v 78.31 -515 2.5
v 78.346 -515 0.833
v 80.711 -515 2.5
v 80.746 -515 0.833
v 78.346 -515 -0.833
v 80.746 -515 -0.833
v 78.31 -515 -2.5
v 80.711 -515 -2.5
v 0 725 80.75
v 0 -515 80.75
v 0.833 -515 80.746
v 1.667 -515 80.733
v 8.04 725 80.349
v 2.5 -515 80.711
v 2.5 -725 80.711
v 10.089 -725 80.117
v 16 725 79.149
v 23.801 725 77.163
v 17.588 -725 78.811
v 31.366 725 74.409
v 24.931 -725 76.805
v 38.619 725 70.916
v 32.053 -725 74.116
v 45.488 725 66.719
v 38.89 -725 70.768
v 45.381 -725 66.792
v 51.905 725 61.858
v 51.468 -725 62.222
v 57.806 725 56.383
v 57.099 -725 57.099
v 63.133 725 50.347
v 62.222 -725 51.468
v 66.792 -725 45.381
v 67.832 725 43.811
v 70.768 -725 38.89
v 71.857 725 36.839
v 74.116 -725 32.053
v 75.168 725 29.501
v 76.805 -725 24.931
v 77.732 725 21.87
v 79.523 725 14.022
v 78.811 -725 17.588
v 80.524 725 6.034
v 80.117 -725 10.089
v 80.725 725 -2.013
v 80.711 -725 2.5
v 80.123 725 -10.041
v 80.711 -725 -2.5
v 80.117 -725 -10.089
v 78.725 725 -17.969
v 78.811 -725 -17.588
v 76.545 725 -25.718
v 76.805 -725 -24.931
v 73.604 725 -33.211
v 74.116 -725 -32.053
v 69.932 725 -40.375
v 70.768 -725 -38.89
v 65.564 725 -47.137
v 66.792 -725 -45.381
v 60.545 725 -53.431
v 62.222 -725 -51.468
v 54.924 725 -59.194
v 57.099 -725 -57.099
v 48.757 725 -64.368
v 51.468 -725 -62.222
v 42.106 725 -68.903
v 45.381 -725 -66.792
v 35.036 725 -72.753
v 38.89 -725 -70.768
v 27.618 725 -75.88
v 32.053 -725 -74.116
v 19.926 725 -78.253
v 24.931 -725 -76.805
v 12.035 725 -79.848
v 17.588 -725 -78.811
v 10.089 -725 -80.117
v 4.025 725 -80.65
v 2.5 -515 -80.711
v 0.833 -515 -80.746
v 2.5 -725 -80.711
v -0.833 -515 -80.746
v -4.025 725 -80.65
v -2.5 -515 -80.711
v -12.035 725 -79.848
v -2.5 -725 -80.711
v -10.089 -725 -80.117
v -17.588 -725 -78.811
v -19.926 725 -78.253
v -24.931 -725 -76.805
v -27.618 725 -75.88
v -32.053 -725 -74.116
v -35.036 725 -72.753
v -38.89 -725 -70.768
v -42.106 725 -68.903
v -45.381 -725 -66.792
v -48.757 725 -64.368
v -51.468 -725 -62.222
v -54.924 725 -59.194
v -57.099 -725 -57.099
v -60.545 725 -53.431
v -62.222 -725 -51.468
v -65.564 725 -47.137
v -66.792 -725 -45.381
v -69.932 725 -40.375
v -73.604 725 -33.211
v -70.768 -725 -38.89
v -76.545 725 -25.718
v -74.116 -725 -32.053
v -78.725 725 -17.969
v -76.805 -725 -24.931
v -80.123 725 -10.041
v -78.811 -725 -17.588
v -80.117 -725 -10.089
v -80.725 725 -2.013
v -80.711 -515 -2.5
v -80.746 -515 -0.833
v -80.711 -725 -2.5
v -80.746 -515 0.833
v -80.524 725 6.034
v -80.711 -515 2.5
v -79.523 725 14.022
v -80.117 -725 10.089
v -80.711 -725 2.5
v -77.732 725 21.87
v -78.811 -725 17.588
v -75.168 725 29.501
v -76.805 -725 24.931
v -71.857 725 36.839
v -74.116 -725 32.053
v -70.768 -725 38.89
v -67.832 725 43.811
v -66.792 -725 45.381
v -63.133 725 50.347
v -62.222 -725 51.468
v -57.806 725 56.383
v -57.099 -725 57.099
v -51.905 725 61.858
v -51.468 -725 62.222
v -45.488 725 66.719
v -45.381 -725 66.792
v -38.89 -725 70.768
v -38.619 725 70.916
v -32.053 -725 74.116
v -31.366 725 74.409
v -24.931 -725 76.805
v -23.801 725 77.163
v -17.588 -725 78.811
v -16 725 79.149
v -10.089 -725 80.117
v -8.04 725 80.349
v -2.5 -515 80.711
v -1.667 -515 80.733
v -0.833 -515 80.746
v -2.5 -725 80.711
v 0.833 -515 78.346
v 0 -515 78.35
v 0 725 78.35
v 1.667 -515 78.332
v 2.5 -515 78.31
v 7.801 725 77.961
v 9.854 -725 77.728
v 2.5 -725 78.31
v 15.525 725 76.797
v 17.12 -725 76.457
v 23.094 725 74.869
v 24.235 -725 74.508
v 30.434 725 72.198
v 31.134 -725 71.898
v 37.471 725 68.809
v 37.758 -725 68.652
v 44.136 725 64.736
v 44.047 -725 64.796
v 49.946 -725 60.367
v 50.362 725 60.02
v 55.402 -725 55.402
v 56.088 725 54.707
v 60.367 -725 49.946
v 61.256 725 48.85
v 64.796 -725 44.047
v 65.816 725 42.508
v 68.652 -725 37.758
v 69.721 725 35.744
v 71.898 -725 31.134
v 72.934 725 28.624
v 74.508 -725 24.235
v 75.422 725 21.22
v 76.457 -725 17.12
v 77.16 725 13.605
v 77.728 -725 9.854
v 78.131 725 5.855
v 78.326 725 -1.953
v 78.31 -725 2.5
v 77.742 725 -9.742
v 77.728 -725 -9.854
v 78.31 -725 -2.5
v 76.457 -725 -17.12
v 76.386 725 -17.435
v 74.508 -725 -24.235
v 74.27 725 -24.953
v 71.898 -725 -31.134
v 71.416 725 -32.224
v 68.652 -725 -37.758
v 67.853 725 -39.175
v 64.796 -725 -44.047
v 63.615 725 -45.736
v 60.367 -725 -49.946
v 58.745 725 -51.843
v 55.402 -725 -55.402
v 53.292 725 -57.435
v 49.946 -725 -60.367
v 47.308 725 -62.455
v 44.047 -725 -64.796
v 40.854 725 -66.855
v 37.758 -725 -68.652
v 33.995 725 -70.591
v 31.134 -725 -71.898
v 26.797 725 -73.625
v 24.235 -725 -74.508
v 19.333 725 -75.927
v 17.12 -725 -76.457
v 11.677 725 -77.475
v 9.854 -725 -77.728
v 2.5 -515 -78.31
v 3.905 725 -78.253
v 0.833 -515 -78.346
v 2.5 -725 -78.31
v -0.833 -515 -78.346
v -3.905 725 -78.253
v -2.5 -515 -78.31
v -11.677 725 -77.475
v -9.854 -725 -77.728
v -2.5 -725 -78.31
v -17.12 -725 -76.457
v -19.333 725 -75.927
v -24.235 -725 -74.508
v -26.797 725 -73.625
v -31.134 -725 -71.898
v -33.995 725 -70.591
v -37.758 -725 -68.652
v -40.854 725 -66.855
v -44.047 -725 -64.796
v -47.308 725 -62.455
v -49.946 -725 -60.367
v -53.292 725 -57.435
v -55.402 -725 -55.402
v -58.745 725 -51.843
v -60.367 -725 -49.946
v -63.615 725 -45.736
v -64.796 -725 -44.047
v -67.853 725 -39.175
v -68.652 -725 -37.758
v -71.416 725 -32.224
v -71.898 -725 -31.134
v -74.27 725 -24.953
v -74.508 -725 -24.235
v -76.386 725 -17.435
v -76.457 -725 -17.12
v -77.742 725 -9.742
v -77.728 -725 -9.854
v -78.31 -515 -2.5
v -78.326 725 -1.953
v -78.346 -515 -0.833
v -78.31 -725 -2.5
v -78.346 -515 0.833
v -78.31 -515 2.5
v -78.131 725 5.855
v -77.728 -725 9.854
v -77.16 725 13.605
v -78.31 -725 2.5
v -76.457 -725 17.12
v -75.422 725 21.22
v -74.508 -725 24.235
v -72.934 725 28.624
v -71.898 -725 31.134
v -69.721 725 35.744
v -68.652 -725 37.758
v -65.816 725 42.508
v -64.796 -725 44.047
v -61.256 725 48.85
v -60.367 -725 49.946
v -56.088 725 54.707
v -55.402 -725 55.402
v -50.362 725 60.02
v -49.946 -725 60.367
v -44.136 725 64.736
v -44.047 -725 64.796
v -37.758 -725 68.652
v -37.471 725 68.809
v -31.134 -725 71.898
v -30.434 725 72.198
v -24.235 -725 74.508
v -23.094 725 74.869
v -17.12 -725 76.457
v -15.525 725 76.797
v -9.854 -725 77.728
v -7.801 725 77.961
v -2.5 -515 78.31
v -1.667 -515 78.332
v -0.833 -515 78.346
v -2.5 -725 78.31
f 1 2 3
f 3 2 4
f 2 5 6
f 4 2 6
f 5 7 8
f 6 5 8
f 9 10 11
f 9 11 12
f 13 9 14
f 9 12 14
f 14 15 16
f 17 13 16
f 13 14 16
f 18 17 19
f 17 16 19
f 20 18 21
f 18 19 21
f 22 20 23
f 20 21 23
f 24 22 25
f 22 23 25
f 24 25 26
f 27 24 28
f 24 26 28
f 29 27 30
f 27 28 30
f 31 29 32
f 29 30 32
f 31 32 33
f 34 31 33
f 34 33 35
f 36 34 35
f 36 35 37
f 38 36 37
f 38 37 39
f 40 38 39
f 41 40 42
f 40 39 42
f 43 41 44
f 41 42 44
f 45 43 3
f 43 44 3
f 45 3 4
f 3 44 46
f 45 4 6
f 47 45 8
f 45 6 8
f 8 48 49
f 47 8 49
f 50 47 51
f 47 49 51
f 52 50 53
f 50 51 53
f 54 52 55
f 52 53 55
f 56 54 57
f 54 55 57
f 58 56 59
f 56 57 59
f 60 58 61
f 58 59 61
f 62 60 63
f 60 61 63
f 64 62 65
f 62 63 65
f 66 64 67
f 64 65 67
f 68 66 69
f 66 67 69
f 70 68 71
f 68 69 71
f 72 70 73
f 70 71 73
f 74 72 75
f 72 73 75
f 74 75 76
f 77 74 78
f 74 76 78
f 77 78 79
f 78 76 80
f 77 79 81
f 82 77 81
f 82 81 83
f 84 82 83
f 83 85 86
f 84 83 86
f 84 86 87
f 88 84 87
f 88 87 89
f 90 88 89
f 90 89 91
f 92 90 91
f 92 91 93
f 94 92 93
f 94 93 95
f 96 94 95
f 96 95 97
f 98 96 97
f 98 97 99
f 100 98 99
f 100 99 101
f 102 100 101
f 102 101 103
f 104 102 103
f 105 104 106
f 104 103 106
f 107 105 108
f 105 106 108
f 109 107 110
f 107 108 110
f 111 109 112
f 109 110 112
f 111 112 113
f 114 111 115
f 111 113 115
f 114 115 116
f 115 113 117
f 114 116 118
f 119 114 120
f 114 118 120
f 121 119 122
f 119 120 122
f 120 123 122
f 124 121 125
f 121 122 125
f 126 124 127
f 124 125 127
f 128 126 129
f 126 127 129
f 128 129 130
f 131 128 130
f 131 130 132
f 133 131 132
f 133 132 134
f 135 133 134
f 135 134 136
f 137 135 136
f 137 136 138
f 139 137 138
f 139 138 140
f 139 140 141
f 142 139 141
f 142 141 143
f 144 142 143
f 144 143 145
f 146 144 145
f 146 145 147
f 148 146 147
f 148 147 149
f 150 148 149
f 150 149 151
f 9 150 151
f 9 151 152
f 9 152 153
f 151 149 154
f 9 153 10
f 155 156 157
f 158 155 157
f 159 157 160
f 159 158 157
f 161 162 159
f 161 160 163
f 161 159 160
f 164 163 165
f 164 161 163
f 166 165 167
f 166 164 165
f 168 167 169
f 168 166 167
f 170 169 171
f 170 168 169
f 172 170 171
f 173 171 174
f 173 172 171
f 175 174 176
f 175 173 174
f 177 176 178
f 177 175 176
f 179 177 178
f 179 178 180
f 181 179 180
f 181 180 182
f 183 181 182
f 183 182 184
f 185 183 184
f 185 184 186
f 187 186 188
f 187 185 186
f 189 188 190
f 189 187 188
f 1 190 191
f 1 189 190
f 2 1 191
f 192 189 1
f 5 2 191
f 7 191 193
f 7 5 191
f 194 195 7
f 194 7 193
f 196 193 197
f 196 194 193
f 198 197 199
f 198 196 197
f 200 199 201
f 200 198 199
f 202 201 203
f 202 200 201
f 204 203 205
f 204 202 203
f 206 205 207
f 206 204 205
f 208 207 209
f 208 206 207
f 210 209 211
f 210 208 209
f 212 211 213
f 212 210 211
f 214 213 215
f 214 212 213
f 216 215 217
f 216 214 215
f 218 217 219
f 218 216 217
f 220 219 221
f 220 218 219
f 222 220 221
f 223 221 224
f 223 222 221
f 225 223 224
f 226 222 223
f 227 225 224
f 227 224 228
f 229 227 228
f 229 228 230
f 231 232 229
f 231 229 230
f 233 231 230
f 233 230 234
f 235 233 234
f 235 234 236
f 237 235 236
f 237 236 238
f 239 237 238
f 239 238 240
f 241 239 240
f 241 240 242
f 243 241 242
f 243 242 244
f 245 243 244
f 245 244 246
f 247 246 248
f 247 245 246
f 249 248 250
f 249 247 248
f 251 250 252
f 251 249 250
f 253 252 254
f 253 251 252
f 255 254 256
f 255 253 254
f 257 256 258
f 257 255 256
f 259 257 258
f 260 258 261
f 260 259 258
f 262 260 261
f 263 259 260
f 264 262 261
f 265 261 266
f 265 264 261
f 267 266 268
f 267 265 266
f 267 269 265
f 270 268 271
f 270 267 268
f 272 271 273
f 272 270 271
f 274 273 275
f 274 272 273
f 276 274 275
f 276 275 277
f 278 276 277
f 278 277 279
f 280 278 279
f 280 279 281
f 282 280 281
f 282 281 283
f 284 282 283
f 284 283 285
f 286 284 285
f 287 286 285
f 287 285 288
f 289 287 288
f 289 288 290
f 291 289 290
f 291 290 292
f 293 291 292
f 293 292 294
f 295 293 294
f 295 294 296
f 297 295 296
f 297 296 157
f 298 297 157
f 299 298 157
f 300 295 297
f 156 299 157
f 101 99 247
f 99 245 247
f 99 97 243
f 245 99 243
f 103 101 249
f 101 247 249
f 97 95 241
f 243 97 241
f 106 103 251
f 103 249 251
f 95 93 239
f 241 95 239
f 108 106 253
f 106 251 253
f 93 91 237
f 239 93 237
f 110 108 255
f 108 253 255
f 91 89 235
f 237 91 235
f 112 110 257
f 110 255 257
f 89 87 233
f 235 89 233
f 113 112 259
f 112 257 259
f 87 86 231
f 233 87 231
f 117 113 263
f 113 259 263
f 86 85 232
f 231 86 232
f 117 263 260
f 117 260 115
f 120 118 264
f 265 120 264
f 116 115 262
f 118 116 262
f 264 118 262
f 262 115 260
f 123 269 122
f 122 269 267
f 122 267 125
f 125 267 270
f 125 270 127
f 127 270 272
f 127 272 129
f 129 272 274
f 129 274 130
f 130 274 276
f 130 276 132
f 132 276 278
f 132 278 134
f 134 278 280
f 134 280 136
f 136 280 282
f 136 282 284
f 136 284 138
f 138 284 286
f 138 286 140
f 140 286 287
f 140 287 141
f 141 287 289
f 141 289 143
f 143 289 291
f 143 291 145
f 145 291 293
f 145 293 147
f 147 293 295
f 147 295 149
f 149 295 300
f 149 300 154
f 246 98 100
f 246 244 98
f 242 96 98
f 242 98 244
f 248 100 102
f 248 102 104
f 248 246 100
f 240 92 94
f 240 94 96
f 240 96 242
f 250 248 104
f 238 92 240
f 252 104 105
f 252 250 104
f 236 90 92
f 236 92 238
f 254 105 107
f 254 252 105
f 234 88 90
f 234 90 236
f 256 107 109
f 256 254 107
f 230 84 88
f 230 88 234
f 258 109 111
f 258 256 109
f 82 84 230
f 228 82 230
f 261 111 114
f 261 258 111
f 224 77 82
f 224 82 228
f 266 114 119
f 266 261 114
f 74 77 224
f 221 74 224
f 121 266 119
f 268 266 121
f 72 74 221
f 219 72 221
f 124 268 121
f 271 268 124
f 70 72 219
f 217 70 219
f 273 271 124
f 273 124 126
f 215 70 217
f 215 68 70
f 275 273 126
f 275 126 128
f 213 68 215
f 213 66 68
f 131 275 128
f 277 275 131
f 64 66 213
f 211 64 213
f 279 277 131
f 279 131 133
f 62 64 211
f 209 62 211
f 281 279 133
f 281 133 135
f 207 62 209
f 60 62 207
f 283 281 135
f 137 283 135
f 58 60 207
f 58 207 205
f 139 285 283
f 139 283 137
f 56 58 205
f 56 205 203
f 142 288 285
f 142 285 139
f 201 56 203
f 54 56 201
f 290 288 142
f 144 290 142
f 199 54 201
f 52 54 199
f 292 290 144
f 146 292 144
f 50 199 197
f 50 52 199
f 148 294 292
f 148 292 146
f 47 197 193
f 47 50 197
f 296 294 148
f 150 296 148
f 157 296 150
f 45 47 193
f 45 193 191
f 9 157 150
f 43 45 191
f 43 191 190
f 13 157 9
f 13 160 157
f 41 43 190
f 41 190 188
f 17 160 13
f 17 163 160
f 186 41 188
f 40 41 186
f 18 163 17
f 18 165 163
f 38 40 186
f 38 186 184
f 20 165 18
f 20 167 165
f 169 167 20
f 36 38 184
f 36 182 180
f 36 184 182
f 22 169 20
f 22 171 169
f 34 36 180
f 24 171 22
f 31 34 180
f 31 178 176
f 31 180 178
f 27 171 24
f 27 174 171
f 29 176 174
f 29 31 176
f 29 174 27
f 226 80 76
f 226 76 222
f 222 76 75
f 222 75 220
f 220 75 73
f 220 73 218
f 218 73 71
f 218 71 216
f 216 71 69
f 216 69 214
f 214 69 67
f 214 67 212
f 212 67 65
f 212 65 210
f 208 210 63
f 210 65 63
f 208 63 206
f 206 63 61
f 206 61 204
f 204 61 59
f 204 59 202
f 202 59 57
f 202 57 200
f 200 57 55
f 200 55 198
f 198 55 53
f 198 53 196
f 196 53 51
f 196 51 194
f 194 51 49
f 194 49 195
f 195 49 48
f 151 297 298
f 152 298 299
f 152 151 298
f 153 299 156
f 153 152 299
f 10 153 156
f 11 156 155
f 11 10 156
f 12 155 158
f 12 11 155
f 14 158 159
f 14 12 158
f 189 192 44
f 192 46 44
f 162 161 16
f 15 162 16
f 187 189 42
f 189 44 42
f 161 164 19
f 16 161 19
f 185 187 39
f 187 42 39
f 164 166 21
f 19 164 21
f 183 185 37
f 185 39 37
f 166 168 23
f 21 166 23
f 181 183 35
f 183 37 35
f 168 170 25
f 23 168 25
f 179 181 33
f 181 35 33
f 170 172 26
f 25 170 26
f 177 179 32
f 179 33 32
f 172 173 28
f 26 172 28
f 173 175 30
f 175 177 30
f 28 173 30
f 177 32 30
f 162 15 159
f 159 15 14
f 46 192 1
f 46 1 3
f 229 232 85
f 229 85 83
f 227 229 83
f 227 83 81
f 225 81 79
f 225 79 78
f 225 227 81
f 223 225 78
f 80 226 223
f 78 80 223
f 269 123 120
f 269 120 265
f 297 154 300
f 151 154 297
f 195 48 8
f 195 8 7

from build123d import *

# Parameters (mm, degrees)
BOSS_EXTRUDE1_DEPTH      = 725
BOSS_EXTRUDE1_DEPTH_BACK = 725
SKETCH1_R                = 80.75
SKETCH1_R_2              = 78.35
SKETCH2_W                = 5
SKETCH2_H                = 210
CUT_EXTRUDE1_DEPTH       = 734.938774694
CIRPATTERN1_START        = -725
CIRPATTERN1_DEPTH        = 210


# Read off the part's stored shape, not the designer's step: CirPattern1
with BuildPart() as part:
    # Sketch1 → Boss-Extrude1 (new, two sides: drawn at the far end of the back side and taken through both)
    with BuildSketch(Plane(origin=(0, 0, 0), x_dir=(1, 0, 0), z_dir=(0, 1, 0)).offset(-BOSS_EXTRUDE1_DEPTH_BACK)):
        with Locations(Location((0, 0, 0), (0, 0, 270))):
            Circle(SKETCH1_R)
        with Locations(Location((0, 0, 0), (0, 0, 270))):
            Circle(SKETCH1_R_2, mode=Mode.SUBTRACT)
    extrude(amount=BOSS_EXTRUDE1_DEPTH + BOSS_EXTRUDE1_DEPTH_BACK)

    # Sketch2 → Cut-Extrude1 (cut, symmetric)
    with BuildSketch(Plane.XY):
        with Locations((0, -620)):
            Rectangle(SKETCH2_W, SKETCH2_H)
    extrude(amount=CUT_EXTRUDE1_DEPTH, both=True, mode=Mode.SUBTRACT)

    # CirPattern1 outline → CirPattern1 (cut)
    with BuildSketch(Plane(origin=(0, 0, 0), x_dir=(1, 0, 0), z_dir=(0, 1, 0)).offset(CIRPATTERN1_START)):
        with BuildLine():
            ThreePointArc((-80.711291032, 2.5), (-80.75, 0), (-80.711291032, -2.5))
            Line((-80.711291032, -2.5), (-78.310104712, -2.5))
            ThreePointArc((-78.310104712, -2.5), (-78.35, 0), (-78.310104712, 2.5))
            Line((-78.310104712, 2.5), (-80.711291032, 2.5))
        make_face()
        with BuildLine():
            Line((78.310104712, -2.5), (80.711291032, -2.5))
            ThreePointArc((80.711291032, -2.5), (80.75, 0), (80.711291032, 2.5))
            Line((80.711291032, 2.5), (78.310104712, 2.5))
            ThreePointArc((78.310104712, 2.5), (78.35, 0), (78.310104712, -2.5))
        make_face()
    extrude(amount=CIRPATTERN1_DEPTH, mode=Mode.SUBTRACT)


solid = part.part
